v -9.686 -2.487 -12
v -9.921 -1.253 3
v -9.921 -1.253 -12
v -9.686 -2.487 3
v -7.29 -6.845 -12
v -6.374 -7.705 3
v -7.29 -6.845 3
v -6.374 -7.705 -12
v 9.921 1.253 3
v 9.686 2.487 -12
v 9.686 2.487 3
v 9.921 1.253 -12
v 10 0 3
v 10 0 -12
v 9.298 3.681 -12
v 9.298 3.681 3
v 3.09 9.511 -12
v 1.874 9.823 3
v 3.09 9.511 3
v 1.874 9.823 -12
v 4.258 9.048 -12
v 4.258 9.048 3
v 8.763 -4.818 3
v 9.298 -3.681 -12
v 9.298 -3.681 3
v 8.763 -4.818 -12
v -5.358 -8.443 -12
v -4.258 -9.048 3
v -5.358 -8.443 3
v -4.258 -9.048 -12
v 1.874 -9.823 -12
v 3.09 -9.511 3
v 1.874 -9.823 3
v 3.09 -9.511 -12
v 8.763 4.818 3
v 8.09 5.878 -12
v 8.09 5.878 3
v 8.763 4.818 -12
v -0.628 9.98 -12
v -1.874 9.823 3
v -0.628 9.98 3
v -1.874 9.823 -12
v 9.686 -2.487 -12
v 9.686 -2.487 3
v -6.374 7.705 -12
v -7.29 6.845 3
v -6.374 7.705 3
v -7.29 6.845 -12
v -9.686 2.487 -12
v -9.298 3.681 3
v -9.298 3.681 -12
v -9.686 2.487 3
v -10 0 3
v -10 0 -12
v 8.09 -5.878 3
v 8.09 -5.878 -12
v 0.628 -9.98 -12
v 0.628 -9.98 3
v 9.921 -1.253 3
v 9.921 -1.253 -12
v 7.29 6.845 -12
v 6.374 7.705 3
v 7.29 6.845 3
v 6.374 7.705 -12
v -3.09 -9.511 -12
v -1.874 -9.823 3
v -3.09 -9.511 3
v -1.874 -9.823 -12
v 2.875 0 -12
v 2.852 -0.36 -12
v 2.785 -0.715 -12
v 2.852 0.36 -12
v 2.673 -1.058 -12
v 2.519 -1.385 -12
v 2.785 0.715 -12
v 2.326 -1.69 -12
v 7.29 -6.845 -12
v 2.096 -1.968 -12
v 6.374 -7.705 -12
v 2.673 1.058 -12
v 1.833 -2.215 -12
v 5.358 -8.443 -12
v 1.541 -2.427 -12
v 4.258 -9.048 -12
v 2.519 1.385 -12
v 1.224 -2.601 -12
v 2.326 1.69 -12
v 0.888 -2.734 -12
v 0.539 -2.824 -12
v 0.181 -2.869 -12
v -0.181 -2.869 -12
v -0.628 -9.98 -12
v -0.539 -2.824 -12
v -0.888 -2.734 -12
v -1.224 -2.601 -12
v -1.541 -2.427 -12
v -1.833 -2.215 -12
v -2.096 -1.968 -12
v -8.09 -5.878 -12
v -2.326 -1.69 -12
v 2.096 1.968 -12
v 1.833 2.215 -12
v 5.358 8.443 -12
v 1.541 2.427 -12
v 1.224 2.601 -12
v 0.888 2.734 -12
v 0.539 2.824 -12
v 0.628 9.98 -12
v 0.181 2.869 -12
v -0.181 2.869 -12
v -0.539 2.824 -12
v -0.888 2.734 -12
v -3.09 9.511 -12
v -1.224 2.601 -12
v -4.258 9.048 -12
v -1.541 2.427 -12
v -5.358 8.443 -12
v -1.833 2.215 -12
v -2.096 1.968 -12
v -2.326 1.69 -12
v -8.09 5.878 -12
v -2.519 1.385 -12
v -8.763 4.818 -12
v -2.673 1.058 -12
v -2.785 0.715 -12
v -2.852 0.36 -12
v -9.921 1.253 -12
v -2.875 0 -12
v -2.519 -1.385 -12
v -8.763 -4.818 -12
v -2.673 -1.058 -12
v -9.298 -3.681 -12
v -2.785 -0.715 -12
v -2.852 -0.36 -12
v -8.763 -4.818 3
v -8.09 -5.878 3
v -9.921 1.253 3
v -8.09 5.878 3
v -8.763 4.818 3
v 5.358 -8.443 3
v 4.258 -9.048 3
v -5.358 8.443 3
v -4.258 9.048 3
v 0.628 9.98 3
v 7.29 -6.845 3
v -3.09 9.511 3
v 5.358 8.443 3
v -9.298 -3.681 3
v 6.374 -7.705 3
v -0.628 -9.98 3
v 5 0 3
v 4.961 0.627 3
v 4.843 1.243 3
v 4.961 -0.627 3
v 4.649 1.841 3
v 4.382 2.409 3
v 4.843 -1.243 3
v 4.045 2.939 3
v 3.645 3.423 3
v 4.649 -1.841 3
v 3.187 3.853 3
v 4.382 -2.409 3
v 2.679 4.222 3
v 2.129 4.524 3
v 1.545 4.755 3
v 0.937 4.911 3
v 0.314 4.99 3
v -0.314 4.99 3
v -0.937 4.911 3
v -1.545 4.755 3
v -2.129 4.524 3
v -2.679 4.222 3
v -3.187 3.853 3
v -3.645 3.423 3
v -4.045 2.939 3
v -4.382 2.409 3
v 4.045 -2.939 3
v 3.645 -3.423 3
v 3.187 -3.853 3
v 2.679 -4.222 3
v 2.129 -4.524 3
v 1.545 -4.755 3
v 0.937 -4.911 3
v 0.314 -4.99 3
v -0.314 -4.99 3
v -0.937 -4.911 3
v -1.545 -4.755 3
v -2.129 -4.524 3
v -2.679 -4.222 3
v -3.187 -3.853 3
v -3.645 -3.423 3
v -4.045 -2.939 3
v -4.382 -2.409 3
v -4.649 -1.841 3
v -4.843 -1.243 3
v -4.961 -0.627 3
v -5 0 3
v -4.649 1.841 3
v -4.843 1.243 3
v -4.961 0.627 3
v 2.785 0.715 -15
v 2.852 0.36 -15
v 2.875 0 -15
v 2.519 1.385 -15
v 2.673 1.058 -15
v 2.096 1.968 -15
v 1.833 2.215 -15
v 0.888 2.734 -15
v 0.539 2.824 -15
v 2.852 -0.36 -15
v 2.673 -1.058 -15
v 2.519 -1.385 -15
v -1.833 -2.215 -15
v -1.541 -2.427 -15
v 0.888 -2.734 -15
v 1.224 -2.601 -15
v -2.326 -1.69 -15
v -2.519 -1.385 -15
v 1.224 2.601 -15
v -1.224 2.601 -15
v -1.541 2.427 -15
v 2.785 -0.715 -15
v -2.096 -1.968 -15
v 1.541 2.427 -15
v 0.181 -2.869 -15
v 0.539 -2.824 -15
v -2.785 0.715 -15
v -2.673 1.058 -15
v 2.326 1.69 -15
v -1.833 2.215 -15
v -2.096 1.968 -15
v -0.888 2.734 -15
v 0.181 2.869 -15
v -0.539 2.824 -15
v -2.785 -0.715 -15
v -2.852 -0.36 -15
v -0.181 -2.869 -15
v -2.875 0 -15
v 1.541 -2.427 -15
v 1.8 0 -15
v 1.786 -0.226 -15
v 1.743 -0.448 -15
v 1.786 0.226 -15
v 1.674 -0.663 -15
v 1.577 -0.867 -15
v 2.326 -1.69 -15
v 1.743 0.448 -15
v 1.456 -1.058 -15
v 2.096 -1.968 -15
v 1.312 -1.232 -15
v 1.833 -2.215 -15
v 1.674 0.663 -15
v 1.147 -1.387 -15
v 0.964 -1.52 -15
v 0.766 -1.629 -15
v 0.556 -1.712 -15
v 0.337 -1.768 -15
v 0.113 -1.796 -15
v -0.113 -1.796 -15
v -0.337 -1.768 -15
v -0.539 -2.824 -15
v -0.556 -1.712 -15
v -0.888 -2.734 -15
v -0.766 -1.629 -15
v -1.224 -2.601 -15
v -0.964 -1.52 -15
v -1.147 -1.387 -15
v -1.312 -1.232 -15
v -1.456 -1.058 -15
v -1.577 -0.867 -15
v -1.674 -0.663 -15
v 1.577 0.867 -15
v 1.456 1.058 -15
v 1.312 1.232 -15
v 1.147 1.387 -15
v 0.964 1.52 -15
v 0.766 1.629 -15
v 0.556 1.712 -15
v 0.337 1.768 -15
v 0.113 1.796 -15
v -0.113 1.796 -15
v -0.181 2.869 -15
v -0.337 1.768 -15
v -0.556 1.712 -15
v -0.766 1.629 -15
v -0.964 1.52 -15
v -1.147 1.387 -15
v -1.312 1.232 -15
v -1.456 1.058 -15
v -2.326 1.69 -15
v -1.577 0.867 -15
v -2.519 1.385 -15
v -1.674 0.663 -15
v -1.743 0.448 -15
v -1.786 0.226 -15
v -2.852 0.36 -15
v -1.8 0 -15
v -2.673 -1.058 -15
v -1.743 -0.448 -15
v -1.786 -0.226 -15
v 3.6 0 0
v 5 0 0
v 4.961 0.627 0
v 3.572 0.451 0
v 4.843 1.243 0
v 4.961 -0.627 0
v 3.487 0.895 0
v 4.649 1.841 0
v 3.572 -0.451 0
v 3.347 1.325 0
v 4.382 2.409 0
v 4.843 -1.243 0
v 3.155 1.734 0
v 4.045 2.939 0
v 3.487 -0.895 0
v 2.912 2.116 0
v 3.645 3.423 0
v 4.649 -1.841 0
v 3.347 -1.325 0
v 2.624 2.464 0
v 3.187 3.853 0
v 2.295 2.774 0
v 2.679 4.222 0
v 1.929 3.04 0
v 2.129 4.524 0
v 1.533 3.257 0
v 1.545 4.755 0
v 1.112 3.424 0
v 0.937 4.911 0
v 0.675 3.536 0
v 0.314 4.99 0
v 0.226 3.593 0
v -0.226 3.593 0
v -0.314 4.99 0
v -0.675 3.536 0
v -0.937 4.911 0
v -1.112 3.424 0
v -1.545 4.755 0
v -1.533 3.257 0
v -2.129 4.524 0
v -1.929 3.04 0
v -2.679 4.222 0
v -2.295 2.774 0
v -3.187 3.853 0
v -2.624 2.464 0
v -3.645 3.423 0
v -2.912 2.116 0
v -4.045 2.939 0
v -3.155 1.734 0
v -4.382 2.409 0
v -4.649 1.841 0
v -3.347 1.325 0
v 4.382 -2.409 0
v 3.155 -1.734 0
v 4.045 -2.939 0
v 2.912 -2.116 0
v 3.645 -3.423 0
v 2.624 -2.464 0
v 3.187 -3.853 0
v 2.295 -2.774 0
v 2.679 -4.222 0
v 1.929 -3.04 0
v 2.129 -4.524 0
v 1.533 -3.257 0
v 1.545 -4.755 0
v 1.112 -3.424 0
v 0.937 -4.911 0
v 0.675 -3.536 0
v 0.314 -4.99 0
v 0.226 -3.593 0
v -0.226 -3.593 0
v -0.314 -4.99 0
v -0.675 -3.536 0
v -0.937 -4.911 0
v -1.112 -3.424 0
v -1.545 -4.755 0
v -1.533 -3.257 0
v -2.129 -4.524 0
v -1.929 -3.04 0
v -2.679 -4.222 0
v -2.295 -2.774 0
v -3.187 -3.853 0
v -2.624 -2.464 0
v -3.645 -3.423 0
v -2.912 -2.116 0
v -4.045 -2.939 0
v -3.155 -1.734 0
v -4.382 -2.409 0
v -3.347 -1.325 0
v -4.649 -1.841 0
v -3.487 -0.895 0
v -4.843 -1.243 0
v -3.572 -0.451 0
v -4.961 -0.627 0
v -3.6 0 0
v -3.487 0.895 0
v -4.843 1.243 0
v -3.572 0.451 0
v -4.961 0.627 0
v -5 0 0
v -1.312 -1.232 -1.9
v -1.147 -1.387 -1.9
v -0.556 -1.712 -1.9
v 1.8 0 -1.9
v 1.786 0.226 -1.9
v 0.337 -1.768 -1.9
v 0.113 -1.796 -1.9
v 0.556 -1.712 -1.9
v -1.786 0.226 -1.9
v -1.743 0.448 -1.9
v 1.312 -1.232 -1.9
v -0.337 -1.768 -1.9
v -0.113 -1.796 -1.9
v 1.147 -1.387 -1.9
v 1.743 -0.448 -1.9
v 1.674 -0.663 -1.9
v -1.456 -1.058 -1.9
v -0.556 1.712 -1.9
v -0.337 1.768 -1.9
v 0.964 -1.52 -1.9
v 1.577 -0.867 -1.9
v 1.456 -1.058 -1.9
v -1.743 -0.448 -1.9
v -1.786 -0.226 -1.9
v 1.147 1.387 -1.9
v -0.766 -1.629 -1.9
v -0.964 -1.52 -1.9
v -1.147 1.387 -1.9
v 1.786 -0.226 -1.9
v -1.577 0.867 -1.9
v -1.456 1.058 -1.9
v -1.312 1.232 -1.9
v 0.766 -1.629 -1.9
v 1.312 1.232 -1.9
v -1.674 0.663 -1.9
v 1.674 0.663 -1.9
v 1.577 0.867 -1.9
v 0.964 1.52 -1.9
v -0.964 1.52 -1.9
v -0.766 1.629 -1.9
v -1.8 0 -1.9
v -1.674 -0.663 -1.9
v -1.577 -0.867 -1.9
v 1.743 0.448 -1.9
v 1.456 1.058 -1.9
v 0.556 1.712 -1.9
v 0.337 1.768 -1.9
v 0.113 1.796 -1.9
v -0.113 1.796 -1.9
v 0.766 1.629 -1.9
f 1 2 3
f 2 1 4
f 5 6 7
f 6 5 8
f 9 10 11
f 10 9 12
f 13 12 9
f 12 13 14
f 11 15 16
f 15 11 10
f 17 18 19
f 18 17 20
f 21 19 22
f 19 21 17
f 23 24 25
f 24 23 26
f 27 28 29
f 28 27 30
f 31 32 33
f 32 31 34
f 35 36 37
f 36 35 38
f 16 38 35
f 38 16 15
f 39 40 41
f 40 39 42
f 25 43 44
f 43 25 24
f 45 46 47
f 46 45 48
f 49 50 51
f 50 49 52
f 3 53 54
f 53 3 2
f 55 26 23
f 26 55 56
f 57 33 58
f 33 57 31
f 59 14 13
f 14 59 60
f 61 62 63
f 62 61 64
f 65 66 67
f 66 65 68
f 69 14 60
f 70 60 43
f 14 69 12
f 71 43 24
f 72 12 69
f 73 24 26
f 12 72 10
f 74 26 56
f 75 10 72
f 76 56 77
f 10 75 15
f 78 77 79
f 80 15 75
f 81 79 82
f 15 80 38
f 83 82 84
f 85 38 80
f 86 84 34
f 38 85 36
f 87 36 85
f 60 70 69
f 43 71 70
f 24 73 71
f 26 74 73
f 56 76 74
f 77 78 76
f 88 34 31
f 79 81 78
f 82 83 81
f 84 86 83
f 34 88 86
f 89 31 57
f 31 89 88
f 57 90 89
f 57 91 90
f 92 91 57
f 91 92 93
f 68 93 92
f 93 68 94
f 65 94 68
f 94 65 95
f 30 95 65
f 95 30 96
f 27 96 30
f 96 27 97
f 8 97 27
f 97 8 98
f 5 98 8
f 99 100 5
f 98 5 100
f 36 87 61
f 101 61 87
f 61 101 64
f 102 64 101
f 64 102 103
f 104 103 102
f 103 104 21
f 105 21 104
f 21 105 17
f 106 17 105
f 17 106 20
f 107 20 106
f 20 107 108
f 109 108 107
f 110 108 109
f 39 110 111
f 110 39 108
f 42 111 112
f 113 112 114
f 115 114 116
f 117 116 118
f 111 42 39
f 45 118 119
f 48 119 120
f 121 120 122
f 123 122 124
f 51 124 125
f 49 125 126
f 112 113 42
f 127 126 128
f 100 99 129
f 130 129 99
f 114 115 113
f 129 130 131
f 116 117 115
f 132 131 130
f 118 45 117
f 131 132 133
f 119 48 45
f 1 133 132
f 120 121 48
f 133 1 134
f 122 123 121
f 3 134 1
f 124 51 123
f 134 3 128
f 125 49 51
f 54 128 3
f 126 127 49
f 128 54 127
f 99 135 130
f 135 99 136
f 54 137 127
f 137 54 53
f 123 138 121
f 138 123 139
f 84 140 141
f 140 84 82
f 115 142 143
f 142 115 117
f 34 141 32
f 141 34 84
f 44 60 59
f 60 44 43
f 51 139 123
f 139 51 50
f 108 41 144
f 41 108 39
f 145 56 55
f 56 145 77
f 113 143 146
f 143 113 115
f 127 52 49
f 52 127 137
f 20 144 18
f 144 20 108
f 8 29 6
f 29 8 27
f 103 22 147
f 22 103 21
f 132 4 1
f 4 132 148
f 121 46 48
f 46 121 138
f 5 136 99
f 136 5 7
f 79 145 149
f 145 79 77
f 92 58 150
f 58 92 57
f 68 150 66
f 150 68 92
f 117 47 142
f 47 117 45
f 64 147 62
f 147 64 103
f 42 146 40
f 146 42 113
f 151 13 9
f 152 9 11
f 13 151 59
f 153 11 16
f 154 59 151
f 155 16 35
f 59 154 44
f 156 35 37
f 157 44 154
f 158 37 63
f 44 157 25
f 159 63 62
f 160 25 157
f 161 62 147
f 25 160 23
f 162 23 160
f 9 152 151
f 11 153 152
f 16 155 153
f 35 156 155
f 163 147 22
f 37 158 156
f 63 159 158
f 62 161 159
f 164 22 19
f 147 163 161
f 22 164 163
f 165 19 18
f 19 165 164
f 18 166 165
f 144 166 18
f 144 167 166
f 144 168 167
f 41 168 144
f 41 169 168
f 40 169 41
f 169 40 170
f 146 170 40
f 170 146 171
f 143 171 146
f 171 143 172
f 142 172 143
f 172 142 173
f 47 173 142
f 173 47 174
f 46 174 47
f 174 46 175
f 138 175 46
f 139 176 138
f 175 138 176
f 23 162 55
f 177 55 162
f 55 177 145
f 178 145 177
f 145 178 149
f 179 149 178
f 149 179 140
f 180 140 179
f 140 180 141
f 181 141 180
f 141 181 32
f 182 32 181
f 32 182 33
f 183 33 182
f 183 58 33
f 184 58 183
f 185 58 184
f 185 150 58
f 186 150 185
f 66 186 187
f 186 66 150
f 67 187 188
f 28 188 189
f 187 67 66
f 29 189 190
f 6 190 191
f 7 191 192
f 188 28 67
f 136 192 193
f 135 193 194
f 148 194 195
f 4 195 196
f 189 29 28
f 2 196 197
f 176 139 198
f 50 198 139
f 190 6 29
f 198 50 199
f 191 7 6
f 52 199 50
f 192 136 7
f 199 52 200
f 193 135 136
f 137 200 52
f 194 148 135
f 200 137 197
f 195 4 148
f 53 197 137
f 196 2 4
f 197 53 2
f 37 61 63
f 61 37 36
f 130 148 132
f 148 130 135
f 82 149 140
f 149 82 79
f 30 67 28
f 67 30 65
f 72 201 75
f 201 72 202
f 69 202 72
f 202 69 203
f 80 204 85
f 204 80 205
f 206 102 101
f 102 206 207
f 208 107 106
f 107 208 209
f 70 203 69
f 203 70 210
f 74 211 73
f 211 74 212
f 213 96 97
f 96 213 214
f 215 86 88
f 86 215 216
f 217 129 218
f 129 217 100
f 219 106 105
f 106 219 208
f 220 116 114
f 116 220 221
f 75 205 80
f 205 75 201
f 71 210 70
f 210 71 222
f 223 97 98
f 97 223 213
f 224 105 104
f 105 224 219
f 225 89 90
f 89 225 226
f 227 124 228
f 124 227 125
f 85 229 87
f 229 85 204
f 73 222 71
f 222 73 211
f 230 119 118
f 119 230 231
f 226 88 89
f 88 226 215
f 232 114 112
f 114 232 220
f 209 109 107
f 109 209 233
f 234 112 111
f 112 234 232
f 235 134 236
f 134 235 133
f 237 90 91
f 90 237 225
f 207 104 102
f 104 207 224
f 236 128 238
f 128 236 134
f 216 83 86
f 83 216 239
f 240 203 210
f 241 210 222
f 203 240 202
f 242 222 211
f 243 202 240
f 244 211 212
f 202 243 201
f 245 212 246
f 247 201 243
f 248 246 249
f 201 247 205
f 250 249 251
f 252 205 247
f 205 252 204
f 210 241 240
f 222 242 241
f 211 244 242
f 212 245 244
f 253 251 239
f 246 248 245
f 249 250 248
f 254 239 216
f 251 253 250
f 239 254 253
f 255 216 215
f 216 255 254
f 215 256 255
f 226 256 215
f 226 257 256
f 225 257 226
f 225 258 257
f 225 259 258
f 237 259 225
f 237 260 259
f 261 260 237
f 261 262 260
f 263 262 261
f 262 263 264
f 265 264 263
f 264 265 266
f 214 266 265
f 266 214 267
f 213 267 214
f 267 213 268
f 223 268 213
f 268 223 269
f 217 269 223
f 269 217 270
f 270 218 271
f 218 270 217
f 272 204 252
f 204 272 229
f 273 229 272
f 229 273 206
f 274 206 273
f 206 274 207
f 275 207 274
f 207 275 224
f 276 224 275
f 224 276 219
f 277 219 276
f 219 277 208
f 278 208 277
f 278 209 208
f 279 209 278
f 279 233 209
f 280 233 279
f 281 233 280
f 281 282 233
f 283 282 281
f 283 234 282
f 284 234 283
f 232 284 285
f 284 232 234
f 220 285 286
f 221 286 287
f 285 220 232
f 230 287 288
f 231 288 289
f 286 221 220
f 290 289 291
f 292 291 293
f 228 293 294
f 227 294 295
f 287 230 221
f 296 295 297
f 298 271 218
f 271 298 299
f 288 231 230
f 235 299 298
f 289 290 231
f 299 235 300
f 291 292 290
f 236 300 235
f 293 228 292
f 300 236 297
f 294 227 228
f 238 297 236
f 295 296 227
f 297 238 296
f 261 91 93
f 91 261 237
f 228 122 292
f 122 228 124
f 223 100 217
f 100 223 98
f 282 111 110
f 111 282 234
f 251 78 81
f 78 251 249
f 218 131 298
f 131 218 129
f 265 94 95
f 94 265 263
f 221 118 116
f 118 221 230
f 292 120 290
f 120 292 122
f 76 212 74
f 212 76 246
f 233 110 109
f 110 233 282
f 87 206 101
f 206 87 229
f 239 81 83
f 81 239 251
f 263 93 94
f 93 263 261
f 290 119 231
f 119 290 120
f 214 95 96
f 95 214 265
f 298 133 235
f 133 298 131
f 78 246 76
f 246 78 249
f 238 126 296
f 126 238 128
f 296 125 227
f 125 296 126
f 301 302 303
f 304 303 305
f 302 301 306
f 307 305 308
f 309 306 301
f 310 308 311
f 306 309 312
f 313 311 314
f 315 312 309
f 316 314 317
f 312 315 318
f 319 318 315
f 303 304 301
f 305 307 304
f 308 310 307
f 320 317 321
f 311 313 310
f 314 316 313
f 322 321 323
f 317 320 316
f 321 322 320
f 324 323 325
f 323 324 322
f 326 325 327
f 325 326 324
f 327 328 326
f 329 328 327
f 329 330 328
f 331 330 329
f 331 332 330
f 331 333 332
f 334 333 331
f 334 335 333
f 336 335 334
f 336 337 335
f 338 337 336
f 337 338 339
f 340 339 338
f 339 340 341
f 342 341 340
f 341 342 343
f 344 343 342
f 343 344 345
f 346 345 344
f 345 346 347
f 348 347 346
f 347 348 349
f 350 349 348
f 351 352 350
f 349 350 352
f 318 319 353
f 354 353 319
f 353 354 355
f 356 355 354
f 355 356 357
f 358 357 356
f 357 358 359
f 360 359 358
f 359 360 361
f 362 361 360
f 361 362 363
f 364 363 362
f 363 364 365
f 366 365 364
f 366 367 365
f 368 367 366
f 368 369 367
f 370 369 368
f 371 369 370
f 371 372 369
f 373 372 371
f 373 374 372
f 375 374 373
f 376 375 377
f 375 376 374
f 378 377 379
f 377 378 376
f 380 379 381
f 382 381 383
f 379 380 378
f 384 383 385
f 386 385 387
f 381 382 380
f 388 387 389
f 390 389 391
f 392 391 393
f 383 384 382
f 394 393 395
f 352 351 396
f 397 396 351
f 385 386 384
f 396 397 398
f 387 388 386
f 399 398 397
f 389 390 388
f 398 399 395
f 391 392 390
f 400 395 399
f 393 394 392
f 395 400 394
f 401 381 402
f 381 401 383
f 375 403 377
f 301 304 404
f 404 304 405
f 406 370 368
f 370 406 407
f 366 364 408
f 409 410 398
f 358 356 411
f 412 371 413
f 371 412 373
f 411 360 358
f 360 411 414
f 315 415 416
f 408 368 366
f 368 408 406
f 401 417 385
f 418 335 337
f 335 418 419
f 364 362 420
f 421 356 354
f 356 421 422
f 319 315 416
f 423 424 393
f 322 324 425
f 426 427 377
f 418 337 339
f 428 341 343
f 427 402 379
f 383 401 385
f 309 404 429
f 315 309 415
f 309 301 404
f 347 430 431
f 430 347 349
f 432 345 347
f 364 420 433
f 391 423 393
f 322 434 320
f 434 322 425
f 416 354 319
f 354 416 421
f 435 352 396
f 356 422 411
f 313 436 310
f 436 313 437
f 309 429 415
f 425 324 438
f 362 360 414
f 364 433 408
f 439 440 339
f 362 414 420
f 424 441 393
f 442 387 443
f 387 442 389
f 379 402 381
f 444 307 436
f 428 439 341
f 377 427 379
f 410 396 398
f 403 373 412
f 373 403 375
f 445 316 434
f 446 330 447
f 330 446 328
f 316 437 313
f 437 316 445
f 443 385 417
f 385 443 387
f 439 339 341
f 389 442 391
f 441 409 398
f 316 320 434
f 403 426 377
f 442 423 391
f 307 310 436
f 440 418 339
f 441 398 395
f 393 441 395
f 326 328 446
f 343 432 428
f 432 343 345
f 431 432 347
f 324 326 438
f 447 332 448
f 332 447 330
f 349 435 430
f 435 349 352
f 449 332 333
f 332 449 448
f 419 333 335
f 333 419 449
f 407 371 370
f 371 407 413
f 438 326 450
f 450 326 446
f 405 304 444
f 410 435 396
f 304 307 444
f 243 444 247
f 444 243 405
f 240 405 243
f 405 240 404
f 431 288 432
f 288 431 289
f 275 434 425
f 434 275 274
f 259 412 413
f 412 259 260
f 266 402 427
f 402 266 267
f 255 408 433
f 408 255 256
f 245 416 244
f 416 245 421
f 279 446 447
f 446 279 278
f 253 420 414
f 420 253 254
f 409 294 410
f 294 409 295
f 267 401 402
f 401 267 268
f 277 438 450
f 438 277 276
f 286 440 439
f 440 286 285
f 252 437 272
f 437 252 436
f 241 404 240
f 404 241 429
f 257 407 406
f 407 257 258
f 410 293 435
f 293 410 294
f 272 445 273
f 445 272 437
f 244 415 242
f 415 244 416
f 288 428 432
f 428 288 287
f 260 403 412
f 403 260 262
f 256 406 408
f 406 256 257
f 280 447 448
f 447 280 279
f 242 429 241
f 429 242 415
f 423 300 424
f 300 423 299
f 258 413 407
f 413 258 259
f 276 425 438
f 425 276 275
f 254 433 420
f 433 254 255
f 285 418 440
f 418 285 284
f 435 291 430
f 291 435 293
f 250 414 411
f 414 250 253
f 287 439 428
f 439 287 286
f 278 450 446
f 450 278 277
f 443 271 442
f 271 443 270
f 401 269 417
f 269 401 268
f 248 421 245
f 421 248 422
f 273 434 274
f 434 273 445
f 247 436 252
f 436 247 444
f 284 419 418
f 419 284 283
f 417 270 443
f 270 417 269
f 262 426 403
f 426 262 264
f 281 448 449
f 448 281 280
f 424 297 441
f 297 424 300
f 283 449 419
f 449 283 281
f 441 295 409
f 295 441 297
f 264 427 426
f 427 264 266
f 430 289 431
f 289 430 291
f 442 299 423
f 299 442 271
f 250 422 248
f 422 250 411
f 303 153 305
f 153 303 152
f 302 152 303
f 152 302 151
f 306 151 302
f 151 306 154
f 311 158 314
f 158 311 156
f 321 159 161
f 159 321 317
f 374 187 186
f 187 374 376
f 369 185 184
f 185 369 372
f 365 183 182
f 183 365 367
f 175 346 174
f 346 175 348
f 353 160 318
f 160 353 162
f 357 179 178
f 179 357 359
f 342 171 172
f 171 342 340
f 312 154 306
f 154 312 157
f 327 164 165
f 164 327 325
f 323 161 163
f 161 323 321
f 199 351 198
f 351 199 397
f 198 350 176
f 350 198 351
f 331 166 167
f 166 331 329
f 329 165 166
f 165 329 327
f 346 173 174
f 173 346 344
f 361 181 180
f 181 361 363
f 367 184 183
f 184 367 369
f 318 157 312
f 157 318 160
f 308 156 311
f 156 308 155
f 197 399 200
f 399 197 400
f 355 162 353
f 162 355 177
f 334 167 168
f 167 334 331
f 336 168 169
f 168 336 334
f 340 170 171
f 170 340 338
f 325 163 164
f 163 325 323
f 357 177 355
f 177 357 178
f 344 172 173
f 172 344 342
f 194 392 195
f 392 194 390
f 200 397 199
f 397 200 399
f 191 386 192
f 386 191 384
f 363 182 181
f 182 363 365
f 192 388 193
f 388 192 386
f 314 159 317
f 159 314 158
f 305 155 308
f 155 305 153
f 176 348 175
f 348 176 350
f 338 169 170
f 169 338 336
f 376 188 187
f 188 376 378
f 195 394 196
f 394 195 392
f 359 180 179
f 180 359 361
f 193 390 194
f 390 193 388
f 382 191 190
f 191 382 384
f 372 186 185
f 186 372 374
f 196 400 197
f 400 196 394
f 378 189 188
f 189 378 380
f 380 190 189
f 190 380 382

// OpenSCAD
$fn = 50;

difference() {
	union() {
		translate(v = [0, 0, -12.0]) {
			cylinder(h = 15, r = 10.0);
		}
		#translate(v = [0, 0, -15.0]) {
			cylinder(h = 15, r = 2.875);
		}
	}
	union() {
		translate(v = [0, 0, 0]) {
			rotate(a = [0, 0, 0]) {
				difference() {
					union() {
						translate(v = [0, 0, -15.0]) {
							cylinder(h = 15, r = 1.5);
						}
						translate(v = [0, 0, -1.9]) {
							cylinder(h = 1.9, r1 = 1.8, r2 = 3.6);
						}
						translate(v = [0, 0, -15.0]) {
							cylinder(h = 15, r = 1.8);
						}
						translate(v = [0, 0, -15.0]) {
							cylinder(h = 15, r = 1.5);
						}
					}
					union();
				}
			}
		}
		#cylinder(h = 3, r = 5.0);
	}
}
